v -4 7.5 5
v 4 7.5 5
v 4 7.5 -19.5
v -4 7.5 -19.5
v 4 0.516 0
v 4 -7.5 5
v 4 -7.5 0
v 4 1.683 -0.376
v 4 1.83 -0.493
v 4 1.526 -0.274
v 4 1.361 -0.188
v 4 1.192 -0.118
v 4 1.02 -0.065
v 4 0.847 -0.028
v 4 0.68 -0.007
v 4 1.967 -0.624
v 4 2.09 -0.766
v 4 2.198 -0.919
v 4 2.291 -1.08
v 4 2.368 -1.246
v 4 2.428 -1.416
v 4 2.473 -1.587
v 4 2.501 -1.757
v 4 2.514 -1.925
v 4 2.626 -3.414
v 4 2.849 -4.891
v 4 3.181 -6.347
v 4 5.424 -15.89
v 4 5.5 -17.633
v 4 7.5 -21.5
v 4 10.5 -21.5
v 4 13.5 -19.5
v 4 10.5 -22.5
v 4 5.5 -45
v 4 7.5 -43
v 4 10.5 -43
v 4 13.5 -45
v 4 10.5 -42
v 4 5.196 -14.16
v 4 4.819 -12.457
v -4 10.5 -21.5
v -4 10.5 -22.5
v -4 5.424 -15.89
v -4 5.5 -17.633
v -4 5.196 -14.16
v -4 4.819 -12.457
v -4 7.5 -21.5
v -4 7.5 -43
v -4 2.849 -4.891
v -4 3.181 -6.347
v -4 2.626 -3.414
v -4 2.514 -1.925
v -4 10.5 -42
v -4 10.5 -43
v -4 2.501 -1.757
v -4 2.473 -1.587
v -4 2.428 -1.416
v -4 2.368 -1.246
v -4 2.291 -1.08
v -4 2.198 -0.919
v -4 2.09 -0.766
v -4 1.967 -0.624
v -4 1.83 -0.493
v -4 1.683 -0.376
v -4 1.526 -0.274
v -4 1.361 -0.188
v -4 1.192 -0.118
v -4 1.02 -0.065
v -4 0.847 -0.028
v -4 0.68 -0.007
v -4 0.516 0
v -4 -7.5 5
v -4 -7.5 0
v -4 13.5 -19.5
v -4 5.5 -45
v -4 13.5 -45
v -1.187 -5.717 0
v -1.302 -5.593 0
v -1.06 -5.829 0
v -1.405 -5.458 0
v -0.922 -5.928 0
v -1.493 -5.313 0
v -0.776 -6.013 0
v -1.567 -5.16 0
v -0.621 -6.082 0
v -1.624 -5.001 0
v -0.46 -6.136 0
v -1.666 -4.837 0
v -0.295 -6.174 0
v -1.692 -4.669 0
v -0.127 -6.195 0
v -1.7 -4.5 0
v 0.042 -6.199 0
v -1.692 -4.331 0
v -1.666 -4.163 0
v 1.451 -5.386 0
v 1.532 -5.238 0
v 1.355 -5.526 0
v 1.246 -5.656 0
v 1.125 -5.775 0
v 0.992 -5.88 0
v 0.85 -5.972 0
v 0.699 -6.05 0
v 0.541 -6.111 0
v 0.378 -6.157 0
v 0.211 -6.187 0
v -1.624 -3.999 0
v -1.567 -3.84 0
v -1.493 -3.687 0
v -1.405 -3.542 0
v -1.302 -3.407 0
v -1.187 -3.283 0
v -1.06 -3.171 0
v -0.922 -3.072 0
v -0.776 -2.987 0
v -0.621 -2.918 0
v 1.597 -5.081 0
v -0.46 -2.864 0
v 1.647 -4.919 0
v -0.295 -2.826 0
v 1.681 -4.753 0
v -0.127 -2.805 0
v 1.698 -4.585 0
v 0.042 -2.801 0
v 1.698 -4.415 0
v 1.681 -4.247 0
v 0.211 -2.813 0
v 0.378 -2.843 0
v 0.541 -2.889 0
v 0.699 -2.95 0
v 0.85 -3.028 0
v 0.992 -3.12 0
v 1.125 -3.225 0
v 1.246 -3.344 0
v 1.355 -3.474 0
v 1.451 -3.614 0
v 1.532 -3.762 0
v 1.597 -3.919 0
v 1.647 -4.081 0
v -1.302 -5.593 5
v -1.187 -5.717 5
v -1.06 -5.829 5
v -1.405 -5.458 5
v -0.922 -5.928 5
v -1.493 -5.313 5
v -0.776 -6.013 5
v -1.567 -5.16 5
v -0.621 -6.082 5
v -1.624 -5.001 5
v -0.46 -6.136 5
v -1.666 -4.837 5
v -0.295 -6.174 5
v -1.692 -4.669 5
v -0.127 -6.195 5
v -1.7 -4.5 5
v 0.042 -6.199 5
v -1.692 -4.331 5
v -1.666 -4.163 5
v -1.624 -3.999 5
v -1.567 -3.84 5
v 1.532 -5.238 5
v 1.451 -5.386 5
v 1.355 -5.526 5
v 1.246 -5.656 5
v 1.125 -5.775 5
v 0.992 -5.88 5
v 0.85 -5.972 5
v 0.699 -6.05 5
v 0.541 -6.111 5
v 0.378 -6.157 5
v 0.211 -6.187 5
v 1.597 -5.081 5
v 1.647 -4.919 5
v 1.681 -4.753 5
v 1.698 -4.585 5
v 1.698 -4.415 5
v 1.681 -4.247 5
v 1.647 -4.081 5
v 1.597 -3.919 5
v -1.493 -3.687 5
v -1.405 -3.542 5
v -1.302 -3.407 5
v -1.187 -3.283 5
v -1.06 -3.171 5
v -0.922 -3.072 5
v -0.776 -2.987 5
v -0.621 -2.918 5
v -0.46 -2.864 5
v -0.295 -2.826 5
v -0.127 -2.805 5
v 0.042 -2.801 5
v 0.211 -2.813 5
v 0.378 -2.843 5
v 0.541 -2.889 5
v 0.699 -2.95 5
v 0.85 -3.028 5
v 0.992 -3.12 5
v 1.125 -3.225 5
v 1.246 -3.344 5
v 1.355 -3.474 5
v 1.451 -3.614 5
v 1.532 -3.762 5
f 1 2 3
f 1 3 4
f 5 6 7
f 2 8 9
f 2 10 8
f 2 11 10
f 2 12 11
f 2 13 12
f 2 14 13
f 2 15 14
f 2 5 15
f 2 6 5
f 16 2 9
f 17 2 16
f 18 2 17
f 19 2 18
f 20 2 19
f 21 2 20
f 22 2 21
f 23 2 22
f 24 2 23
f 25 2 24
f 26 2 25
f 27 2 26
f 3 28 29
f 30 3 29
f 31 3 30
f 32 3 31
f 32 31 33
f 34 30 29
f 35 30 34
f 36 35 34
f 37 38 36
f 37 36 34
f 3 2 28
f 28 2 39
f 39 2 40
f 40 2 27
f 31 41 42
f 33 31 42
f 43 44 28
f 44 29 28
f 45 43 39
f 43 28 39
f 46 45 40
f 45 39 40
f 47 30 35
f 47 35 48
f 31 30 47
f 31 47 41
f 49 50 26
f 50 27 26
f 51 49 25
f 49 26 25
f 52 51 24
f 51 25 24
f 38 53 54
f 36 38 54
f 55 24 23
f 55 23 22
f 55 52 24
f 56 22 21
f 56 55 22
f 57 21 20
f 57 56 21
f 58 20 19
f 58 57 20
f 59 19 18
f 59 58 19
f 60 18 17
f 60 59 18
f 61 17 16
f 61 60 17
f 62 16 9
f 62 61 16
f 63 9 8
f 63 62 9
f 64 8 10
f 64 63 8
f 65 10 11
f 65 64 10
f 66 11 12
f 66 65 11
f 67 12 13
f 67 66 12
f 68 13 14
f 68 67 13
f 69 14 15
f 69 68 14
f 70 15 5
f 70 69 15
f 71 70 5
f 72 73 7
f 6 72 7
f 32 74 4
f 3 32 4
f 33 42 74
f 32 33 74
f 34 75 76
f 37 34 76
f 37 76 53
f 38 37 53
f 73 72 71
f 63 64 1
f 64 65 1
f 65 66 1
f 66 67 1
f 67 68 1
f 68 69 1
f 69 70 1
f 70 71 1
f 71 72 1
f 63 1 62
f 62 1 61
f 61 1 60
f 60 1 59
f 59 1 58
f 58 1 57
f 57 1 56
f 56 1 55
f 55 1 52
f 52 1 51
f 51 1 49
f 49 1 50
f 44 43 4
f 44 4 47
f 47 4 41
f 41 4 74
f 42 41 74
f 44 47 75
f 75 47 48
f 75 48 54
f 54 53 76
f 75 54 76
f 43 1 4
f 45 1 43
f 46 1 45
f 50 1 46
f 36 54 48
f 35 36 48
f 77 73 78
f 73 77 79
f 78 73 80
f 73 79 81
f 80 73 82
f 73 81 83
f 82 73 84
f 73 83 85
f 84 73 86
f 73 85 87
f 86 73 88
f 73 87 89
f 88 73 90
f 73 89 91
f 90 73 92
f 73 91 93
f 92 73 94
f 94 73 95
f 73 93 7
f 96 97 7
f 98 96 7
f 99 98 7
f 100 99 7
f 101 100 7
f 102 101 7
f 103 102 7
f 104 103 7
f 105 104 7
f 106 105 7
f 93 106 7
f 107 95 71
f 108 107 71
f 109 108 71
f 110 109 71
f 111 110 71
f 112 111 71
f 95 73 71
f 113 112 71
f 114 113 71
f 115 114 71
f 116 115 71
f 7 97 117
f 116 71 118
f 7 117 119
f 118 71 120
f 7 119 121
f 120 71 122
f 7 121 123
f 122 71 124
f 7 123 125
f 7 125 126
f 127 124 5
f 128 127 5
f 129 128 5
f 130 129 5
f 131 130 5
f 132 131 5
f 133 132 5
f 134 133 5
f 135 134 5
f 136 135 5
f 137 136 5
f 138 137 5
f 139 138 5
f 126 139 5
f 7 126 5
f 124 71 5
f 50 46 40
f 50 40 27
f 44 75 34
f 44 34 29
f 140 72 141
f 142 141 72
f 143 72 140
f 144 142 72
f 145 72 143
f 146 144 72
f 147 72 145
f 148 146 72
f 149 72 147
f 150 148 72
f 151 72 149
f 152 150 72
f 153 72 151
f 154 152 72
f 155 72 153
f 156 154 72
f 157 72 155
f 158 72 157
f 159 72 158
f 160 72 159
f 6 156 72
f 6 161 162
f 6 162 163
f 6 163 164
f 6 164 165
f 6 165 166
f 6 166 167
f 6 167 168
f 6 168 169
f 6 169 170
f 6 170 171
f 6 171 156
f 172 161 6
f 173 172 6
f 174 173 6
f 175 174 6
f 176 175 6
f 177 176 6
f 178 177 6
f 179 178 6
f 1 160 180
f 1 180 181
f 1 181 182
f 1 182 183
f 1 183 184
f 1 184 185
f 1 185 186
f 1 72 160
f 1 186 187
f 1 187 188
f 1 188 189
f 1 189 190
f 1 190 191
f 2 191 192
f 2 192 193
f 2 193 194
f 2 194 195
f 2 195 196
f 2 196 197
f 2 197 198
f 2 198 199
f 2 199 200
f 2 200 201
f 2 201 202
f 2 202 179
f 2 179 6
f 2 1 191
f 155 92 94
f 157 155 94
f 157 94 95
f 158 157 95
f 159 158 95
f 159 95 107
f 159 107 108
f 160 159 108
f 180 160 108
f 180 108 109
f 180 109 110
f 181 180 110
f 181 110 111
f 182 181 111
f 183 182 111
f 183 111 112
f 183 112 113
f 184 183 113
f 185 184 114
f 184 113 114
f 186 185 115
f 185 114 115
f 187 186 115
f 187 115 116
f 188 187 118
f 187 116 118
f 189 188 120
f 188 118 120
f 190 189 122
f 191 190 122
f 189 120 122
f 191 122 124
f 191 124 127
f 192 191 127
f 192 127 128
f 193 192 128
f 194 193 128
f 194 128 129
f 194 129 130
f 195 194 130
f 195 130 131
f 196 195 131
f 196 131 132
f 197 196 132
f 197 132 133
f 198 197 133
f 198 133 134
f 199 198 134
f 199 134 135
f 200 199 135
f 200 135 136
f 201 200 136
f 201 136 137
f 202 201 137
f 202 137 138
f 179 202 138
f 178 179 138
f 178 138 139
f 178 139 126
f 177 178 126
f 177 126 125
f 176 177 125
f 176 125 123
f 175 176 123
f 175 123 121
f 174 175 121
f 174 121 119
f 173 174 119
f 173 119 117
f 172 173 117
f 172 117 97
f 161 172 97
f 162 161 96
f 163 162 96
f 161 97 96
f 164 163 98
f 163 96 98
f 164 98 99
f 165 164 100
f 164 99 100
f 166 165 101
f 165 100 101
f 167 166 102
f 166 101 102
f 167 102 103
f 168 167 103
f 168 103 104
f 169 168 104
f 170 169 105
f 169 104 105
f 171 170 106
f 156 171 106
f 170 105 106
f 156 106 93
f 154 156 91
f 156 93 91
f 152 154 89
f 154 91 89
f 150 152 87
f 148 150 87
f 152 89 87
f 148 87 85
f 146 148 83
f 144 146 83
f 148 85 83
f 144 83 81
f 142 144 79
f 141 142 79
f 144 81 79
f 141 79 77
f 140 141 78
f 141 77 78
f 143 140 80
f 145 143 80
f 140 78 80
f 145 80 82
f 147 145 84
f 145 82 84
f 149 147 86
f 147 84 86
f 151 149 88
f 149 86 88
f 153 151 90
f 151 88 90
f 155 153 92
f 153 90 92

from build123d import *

# Parameters (mm, degrees)
SKETCH_1_W          = 8
SKETCH_1_H          = 15
EXTRUDE_1_DEPTH     = 5
SKETCH_2_W          = 8
SKETCH_2_H          = 5
EXTRUDE_2_DEPTH     = 45
EXTRUDE_3_DEPTH     = 8
CUT_EXTRUDE_1_DEPTH = 48.657633177
FILLET_1_R          = 20
FILLET_2_R          = 2
HOLE_WIZARD_M3_1_D  = 3.4


with BuildPart() as part:
    # ｽｹｯﾁ1 → ﾎﾞｽ - 押し出し1 (new body)
    with BuildSketch(Plane.XY):
        Rectangle(SKETCH_1_W, SKETCH_1_H)
    extrude(amount=EXTRUDE_1_DEPTH)

    # ｽｹｯﾁ2 → ﾎﾞｽ - 押し出し2 (add)
    with BuildSketch(Plane(origin=(0, 0, 0), x_dir=(-1, 0, 0), z_dir=(0, 0, -1))):
        with Locations((0, 5)):
            Rectangle(SKETCH_2_W, SKETCH_2_H)
    extrude(amount=EXTRUDE_2_DEPTH)

    # ｽｹｯﾁ4 → ﾎﾞｽ - 押し出し3 (add)
    with BuildSketch(Plane.ZY.offset(4)):
        Polygon((-45, 7.5), (-45, 13.5), (-42, 10.5), (-43, 10.5), (-43, 7.5), align=None)
        Polygon((-21.5, 7.5), (-21.5, 10.5), (-22.5, 10.5), (-19.5, 13.5), (-19.5, 7.5), align=None)
    extrude(amount=-EXTRUDE_3_DEPTH)

    # ｽｹｯﾁ5 → ｶｯﾄ - 押し出し1 (cut, through all)
    with BuildSketch(Plane.ZY.offset(4)):
        Polygon((-45, 2.5), (-45, 5.5), (-15, 5.5), (-3.803847577, 2.5), align=None)
    extrude(amount=-CUT_EXTRUDE_1_DEPTH, mode=Mode.SUBTRACT)

    # ﾌｨﾚｯﾄ1
    fillet_1_edges = [part.edges().sort_by_distance(p)[0] for p in [
        (0, 2.5, -3.803847577),
        (0, 5.5, -15),
    ]]
    fillet(fillet_1_edges, radius=FILLET_1_R)

    # ﾌｨﾚｯﾄ2
    fillet_2_edges = [part.edges().sort_by_distance(p)[0] for p in [
        (0, 2.5, 0),
    ]]
    fillet(fillet_2_edges, radius=FILLET_2_R)

    # M3 すきま穴1 (through all)
    with Locations(Plane.XY.offset(5)):
        with Locations((0, -4.5)):
            Hole(HOLE_WIZARD_M3_1_D / 2)


solid = part.part
